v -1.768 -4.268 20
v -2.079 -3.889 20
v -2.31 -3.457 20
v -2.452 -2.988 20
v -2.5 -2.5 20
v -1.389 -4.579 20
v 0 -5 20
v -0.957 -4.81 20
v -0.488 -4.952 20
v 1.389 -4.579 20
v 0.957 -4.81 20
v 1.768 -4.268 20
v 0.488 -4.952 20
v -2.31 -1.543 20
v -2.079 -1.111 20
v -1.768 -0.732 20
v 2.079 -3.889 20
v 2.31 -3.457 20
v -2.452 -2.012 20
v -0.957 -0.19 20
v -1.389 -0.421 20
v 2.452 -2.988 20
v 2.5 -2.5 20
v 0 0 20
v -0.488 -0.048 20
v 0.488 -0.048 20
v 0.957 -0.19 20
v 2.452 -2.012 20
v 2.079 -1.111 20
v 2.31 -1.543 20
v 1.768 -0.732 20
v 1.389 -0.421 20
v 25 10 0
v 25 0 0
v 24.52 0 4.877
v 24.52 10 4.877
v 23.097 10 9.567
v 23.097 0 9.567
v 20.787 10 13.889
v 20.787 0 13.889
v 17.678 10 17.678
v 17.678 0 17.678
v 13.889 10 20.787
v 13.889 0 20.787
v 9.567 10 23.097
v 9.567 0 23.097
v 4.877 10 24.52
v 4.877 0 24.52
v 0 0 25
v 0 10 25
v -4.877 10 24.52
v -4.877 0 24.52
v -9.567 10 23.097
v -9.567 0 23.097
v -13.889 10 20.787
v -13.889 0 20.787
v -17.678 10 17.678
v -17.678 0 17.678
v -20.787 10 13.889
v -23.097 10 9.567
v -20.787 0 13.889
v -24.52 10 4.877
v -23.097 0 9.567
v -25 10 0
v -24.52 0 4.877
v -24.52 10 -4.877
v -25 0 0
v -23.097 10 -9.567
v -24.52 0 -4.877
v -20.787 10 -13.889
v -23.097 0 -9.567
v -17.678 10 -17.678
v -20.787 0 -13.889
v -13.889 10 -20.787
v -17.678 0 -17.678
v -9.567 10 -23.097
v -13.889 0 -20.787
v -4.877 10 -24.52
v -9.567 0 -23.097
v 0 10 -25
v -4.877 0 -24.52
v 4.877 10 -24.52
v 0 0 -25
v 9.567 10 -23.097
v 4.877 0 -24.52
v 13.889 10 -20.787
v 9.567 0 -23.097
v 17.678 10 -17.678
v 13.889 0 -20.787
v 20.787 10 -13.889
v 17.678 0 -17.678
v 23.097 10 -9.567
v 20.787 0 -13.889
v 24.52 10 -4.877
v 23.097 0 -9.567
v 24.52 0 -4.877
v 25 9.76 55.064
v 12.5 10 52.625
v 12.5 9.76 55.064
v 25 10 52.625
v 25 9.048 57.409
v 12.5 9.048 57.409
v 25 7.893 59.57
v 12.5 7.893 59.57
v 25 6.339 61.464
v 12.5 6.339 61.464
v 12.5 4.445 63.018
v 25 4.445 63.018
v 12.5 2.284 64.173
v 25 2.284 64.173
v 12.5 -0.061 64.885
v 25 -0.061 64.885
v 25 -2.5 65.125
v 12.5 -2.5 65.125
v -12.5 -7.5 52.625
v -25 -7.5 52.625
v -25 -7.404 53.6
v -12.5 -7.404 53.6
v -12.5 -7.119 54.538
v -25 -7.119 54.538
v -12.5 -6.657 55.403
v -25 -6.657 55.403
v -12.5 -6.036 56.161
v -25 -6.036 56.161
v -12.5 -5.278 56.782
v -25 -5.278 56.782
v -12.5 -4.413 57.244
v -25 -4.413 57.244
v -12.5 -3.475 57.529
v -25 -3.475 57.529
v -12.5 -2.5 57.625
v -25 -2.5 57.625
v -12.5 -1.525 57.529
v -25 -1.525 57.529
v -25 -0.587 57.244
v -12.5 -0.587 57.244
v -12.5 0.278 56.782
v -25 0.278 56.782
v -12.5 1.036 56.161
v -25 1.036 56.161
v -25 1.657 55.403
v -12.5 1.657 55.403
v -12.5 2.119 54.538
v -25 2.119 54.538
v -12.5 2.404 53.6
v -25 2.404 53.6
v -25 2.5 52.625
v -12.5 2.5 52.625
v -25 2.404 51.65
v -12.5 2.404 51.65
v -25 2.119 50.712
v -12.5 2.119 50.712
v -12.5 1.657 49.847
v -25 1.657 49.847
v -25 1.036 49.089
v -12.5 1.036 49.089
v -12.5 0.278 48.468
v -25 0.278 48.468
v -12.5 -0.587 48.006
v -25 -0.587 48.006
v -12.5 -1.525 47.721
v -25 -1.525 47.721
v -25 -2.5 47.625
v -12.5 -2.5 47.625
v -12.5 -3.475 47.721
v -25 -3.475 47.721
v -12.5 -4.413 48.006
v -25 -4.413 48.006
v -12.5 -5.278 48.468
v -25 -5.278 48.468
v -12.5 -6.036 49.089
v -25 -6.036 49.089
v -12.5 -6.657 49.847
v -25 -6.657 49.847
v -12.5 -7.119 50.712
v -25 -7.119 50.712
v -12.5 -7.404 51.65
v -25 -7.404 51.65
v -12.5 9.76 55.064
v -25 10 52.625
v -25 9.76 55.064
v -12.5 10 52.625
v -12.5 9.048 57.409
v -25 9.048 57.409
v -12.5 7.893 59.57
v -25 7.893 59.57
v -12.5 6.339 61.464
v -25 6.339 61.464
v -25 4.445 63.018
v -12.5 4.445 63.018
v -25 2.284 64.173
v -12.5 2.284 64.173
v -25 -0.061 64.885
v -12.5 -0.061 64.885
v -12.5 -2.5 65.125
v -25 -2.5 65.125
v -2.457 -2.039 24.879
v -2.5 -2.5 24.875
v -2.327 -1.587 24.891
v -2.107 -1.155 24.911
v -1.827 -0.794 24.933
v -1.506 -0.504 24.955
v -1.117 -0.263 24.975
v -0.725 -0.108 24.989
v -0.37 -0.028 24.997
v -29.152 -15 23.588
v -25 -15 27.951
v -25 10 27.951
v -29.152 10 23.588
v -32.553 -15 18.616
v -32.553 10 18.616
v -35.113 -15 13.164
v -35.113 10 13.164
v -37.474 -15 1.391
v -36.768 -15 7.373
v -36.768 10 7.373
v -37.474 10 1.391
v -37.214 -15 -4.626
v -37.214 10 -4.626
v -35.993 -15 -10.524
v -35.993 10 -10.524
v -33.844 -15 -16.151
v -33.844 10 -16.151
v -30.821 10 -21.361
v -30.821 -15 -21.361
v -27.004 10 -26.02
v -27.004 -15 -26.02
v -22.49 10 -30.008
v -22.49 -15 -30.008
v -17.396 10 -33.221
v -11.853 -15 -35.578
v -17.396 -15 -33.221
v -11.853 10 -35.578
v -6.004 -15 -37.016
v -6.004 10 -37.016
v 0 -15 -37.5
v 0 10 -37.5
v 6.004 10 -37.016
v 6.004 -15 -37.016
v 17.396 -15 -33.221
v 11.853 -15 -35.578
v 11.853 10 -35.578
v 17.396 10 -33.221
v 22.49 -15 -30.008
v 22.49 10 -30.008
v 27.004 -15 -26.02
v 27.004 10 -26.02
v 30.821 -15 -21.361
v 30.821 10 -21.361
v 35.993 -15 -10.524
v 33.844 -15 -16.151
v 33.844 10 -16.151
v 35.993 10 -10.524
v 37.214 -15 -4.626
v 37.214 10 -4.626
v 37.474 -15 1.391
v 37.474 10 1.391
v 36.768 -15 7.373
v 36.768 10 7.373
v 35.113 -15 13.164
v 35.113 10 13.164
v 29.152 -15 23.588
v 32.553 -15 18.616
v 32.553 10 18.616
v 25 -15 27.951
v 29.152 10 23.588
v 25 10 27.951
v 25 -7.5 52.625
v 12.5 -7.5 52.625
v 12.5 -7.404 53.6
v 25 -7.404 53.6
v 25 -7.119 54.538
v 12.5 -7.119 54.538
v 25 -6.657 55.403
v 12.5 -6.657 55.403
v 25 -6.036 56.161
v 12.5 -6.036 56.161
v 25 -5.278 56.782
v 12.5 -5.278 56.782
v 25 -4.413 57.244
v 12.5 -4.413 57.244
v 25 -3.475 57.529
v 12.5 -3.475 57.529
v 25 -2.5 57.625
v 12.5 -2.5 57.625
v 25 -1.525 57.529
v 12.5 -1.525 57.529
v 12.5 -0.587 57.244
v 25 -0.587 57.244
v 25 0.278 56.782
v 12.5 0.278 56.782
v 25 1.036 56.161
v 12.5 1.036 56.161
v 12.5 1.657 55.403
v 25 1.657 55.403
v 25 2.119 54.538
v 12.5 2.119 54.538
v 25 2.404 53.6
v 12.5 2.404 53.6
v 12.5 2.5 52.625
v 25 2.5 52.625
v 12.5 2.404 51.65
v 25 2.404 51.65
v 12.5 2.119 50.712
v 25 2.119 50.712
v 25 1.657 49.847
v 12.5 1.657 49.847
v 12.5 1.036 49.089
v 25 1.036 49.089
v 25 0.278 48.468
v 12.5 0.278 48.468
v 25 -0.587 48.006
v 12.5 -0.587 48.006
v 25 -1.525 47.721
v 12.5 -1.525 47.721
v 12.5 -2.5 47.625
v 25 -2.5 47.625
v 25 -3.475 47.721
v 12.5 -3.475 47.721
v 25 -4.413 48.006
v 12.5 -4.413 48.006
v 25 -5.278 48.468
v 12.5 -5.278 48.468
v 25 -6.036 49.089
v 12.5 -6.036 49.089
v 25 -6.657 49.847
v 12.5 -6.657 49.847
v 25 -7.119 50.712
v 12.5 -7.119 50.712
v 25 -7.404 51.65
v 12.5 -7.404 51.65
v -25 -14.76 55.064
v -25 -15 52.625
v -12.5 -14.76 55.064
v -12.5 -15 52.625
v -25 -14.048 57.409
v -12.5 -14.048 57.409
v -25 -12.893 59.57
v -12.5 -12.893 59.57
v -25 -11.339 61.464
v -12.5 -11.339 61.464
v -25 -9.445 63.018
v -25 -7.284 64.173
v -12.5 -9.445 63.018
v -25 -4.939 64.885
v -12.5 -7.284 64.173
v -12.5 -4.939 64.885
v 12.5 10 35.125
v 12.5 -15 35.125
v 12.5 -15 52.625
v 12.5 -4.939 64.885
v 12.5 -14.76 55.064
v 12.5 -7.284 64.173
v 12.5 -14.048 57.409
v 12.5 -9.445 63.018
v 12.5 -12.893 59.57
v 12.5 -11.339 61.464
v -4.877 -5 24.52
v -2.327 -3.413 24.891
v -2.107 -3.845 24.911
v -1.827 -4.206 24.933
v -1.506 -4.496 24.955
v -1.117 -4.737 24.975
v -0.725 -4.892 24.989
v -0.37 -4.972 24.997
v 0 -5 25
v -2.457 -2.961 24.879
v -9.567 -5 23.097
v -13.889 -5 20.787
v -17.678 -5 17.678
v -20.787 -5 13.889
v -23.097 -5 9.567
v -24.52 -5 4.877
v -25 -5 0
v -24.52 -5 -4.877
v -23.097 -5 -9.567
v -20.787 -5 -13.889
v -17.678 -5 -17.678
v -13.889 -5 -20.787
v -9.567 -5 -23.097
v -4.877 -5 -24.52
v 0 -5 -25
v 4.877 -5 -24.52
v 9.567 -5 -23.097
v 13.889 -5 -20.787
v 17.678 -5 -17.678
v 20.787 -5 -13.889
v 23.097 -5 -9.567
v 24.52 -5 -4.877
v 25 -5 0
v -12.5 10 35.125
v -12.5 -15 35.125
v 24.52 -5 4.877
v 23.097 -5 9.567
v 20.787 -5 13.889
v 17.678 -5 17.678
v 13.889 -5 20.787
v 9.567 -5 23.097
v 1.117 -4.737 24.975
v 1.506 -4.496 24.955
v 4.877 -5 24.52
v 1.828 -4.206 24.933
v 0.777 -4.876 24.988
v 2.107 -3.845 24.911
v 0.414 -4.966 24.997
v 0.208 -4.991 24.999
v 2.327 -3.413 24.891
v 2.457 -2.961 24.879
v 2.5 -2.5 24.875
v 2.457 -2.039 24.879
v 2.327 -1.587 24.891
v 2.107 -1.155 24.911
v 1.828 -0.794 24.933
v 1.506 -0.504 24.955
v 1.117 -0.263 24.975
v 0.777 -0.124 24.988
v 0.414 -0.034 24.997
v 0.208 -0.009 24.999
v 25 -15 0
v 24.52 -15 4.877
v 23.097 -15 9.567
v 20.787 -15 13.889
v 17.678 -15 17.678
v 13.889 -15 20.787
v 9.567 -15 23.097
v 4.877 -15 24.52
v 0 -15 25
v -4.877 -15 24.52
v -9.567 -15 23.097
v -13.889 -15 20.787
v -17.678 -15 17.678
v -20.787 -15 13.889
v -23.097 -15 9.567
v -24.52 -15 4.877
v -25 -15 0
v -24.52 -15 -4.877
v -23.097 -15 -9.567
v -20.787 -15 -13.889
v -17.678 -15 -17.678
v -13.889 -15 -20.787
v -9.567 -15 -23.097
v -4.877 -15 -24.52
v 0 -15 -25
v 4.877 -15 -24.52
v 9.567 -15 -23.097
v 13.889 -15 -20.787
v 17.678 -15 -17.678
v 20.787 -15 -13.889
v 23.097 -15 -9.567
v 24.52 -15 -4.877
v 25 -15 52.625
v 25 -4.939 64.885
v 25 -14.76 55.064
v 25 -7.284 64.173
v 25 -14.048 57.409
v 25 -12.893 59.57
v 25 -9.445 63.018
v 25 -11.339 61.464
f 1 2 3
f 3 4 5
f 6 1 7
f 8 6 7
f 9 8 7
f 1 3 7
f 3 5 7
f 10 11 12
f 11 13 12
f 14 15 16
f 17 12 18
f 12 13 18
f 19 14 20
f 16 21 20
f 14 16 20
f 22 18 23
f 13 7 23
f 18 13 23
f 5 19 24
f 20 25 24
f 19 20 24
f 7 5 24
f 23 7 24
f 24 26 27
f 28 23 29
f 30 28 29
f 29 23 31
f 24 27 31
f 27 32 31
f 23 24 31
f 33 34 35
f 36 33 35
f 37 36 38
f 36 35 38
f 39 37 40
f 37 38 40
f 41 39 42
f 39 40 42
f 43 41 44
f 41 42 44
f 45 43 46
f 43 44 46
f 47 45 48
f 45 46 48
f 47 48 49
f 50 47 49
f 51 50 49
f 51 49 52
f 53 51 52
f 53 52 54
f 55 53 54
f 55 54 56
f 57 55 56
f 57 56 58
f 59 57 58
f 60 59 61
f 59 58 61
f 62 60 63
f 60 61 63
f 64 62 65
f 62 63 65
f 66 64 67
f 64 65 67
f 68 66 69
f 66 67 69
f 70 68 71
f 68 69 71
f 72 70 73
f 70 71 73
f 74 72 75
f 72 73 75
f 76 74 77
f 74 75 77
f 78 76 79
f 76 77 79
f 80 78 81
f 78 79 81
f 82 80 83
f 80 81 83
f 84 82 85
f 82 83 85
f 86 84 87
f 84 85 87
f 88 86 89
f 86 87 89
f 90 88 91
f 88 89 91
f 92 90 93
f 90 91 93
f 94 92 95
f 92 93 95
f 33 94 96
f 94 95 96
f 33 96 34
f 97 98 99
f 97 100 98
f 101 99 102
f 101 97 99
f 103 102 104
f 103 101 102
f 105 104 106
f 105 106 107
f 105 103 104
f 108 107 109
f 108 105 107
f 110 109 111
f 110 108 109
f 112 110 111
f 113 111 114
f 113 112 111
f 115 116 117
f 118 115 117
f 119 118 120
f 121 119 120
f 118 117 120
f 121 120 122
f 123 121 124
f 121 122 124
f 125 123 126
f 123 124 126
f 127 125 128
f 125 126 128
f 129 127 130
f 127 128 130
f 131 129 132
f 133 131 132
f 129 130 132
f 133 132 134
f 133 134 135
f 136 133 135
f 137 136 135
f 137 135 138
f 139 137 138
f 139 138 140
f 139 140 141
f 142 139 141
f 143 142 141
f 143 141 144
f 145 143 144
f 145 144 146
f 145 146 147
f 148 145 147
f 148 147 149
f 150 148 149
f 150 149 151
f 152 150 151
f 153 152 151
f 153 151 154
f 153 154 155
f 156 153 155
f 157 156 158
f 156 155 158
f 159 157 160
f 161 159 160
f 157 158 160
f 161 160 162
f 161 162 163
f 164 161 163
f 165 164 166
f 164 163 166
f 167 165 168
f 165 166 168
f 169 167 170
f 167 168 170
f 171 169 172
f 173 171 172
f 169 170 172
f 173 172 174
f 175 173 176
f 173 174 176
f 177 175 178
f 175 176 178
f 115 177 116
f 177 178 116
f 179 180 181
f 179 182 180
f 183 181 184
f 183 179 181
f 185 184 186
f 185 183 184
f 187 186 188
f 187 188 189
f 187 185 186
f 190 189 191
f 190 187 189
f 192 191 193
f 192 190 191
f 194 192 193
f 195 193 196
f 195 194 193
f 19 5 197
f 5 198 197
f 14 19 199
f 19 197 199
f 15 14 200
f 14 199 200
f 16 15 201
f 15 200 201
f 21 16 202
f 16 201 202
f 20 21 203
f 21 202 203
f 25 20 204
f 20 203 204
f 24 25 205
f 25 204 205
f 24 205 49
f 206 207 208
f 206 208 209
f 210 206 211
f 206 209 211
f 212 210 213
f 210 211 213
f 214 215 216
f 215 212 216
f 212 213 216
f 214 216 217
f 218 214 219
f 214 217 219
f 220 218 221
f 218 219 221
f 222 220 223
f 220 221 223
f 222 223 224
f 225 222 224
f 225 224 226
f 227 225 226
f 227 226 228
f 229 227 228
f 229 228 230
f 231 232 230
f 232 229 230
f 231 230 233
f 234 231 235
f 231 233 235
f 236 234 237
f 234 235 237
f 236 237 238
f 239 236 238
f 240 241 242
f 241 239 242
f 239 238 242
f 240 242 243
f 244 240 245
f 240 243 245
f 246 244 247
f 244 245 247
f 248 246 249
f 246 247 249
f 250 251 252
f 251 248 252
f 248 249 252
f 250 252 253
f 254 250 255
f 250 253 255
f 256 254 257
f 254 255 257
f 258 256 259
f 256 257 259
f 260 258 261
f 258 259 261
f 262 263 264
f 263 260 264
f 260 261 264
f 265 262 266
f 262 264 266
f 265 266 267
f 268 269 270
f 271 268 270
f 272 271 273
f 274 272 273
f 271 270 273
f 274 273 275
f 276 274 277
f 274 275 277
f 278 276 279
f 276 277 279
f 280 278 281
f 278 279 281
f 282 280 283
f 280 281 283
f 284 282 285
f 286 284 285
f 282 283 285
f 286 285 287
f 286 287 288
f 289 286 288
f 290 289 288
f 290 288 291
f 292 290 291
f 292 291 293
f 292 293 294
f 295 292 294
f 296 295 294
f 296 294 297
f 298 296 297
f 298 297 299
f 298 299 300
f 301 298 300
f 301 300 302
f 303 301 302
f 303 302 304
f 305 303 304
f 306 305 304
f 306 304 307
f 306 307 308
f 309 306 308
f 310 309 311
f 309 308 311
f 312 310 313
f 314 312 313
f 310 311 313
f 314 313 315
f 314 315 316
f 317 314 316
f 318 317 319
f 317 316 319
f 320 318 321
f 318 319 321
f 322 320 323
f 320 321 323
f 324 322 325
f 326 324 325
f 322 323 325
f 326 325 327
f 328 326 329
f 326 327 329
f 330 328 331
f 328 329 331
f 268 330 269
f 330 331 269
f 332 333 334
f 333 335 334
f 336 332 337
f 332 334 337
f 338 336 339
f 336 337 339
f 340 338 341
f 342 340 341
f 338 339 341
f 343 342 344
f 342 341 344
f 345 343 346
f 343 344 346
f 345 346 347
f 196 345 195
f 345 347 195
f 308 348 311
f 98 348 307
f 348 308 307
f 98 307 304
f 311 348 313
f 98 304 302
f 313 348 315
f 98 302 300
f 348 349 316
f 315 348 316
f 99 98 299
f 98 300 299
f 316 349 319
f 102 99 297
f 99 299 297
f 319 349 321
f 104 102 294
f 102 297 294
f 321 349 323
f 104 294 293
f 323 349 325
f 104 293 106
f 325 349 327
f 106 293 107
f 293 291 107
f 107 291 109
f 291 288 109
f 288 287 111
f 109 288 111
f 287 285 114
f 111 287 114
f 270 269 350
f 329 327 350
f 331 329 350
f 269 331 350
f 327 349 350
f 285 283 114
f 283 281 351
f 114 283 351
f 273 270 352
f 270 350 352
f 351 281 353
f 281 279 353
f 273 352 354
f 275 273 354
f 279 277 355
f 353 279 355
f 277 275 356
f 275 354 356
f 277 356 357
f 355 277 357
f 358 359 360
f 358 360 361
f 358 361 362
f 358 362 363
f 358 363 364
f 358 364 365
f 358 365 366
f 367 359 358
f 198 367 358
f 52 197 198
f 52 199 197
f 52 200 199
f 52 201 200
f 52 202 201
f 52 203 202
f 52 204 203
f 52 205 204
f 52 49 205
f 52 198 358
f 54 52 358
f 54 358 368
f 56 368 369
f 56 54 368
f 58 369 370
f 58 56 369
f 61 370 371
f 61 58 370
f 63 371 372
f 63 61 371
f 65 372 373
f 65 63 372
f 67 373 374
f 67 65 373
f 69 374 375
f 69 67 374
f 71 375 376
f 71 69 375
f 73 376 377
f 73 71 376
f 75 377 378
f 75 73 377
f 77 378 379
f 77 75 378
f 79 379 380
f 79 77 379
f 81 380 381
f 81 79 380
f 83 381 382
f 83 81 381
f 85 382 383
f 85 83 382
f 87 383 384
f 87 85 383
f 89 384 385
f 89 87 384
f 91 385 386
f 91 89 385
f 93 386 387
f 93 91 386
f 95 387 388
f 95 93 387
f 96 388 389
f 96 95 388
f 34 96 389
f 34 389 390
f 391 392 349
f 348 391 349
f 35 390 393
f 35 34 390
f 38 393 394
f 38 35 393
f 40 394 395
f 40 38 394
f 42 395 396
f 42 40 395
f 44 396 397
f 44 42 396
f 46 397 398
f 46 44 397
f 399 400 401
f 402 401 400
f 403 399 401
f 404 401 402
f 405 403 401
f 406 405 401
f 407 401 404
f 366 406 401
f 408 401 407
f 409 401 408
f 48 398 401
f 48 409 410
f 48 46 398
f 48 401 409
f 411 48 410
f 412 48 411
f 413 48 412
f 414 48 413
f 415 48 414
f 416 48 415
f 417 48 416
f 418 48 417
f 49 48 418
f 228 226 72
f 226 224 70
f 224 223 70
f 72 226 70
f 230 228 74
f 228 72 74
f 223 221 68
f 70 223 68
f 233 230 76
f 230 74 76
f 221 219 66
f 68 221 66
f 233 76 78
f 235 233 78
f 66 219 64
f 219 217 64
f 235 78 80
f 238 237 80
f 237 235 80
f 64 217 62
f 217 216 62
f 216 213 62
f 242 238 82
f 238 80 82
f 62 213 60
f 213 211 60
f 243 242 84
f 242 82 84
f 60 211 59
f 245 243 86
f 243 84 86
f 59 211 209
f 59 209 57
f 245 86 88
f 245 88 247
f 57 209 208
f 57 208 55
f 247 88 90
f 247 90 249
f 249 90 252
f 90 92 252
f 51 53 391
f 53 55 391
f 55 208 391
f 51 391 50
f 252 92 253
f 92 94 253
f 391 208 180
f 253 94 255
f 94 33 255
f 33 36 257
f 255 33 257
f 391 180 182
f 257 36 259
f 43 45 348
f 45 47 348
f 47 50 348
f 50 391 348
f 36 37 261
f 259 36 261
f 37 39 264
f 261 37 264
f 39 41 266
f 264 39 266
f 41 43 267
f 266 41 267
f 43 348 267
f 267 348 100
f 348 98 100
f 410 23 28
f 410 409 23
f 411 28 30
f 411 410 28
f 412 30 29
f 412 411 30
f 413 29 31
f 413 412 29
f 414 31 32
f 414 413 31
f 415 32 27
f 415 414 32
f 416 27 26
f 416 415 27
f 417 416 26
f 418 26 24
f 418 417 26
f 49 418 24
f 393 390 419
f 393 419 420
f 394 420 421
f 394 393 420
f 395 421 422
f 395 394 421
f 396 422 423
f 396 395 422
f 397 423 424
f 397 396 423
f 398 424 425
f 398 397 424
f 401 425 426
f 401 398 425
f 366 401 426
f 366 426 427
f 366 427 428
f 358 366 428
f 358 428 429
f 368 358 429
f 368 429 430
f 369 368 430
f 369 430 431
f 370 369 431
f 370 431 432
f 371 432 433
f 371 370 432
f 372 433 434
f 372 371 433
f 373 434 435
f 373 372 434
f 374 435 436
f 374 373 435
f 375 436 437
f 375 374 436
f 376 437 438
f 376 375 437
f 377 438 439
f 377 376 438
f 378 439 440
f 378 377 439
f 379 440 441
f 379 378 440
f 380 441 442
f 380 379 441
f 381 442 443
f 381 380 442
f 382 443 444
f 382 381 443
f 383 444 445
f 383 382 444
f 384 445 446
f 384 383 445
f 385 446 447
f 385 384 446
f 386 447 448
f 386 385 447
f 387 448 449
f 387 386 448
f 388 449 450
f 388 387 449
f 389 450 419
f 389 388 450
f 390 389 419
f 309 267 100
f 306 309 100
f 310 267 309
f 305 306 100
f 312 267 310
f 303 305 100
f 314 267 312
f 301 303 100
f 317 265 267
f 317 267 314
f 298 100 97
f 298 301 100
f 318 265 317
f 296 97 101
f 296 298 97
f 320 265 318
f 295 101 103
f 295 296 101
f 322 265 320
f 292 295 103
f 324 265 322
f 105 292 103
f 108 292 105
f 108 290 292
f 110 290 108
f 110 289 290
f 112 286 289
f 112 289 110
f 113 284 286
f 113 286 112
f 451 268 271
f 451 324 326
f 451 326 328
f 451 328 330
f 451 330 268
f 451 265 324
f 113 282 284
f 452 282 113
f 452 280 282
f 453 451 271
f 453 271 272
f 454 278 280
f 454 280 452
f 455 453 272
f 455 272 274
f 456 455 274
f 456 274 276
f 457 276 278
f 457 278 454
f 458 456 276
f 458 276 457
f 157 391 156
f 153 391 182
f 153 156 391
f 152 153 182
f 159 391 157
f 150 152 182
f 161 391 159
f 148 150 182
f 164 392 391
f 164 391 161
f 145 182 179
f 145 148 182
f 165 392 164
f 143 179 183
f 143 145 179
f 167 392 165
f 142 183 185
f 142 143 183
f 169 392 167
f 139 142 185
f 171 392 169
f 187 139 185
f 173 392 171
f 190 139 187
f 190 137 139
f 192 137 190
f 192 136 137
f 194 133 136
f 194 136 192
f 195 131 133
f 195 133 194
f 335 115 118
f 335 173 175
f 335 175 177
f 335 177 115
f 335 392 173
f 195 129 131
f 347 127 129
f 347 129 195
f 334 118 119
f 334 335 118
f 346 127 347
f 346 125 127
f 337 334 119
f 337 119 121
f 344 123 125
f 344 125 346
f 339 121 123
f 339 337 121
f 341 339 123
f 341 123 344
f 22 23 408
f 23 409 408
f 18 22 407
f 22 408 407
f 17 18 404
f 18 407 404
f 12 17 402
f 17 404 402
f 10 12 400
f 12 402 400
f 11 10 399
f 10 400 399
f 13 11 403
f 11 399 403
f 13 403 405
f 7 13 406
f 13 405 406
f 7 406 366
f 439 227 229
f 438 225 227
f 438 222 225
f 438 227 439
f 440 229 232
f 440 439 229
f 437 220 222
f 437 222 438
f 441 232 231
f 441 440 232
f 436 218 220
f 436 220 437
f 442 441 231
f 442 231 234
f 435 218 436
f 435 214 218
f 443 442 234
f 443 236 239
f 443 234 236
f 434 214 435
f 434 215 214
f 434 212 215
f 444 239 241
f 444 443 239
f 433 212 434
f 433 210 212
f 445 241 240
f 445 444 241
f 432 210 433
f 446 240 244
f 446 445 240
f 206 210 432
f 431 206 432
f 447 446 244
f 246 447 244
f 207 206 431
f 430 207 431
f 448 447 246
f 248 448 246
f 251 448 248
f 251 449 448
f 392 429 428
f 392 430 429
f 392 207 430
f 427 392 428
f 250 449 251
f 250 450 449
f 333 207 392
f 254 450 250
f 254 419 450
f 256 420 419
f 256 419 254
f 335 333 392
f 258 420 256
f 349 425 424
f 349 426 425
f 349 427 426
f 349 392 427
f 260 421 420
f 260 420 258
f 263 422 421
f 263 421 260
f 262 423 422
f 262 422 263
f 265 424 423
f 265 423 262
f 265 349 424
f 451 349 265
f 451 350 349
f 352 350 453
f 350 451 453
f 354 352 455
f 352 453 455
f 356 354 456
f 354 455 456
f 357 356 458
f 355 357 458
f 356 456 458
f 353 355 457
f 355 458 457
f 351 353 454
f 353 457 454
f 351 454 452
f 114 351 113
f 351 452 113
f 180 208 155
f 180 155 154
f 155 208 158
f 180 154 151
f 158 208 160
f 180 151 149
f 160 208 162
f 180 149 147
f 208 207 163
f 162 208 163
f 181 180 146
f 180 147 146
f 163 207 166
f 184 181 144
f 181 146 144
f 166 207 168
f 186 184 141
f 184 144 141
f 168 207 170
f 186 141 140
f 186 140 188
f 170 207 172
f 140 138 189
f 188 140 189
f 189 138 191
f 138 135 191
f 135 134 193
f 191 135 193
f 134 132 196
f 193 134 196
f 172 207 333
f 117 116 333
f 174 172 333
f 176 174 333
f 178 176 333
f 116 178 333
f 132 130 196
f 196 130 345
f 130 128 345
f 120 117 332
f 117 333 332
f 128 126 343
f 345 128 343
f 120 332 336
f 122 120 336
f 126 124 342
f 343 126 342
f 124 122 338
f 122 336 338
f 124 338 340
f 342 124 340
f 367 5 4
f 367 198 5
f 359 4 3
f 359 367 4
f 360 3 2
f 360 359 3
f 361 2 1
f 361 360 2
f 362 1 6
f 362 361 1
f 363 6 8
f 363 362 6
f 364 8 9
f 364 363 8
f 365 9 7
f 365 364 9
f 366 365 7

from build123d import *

# Parameters (mm, degrees)
F0_R          = 37.5
F0_R_2        = 25
F1_DEPTH      = 5
F2_W          = 5
F2_H          = 10
F3_DEPTH      = 5
F4_R          = 2.49999
F5_R          = 37.5
F5_R_2        = 25
F6_DEPTH      = 10
F6_DEPTH_BACK = 15
F7_W          = 50
F7_H          = 40
F8_DEPTH      = 15
F8_DEPTH_BACK = 10
F9_W          = 25
F9_H          = 30
F10_DEPTH     = 25
F11_R         = 12.49999
F12_R         = 5
F13_DEPTH     = 62.501


# Not quite as in the source:
# - a fillet or chamfer is up to 0.001 mm smaller than in the source, because OpenCascade refuses the exact size


with BuildPart() as f1:
    # F0 (on Front) → F1 (new body)
    with BuildSketch(Plane.XZ):
        Circle(F0_R)
        Circle(F0_R_2, mode=Mode.SUBTRACT)
    extrude(amount=F1_DEPTH)

    # F2 (on Front) → F3 (join)
    with BuildSketch(Plane.XZ):
        with Locations((0, 25)):
            Rectangle(F2_W, F2_H)
    extrude(amount=F3_DEPTH)

    # F4 (radius 2.5 in the source; OpenCascade refuses exactly that, so slightly less here)
    f4_edges = [f1.edges().sort_by_distance(p)[0] for p in [
        (-2.5, -5, 22.437343),
        (2.5, -5, 22.437343),
        (-2.5, 0, 22.437343),
        (2.5, 0, 22.437343),
    ]]
    fillet(f4_edges, radius=F4_R)

    # F5 (on face) → F6 (join, two sides)
    with BuildSketch(Plane.XZ.offset(5)) as f6_sk:
        Circle(F5_R)
        Circle(F5_R_2, mode=Mode.SUBTRACT)
    extrude(amount=F6_DEPTH)
    extrude(f6_sk.sketch, amount=-F6_DEPTH_BACK)

    # F7 (on Front) → F8 (join, two sides)
    with BuildSketch(Plane.XZ) as f8_sk:
        with Locations((0, 45.1250001788)):
            Rectangle(F7_W, F7_H)
    extrude(amount=F8_DEPTH)
    extrude(f8_sk.sketch, amount=-F8_DEPTH_BACK)

    # F9 (on face) → F10 (cut)
    with BuildSketch(Plane.XZ.offset(15)):
        with Locations((0, 50.1250001788)):
            Rectangle(F9_W, F9_H)
    extrude(amount=-F10_DEPTH, mode=Mode.SUBTRACT)

    # F11 (radius 12.5 in the source; OpenCascade refuses exactly that, so slightly less here)
    f11_edges = [f1.edges().sort_by_distance(p)[0] for p in [
        (-18.75, 10, 65.125),
        (-18.75, -15, 65.125),
        (18.75, -15, 65.125),
        (18.75, 10, 65.125),
    ]]
    fillet(f11_edges, radius=F11_R)

    # F12 (on face) → F13 (cut, through all)
    with BuildSketch(Plane(origin=(-25, 0, 0), x_dir=(0, -1, 0), z_dir=(-1, 0, 0))):
        with Locations((2.5, 52.6250001788)):
            Circle(F12_R)
    extrude(amount=-F13_DEPTH, mode=Mode.SUBTRACT)


solid = f1.part
